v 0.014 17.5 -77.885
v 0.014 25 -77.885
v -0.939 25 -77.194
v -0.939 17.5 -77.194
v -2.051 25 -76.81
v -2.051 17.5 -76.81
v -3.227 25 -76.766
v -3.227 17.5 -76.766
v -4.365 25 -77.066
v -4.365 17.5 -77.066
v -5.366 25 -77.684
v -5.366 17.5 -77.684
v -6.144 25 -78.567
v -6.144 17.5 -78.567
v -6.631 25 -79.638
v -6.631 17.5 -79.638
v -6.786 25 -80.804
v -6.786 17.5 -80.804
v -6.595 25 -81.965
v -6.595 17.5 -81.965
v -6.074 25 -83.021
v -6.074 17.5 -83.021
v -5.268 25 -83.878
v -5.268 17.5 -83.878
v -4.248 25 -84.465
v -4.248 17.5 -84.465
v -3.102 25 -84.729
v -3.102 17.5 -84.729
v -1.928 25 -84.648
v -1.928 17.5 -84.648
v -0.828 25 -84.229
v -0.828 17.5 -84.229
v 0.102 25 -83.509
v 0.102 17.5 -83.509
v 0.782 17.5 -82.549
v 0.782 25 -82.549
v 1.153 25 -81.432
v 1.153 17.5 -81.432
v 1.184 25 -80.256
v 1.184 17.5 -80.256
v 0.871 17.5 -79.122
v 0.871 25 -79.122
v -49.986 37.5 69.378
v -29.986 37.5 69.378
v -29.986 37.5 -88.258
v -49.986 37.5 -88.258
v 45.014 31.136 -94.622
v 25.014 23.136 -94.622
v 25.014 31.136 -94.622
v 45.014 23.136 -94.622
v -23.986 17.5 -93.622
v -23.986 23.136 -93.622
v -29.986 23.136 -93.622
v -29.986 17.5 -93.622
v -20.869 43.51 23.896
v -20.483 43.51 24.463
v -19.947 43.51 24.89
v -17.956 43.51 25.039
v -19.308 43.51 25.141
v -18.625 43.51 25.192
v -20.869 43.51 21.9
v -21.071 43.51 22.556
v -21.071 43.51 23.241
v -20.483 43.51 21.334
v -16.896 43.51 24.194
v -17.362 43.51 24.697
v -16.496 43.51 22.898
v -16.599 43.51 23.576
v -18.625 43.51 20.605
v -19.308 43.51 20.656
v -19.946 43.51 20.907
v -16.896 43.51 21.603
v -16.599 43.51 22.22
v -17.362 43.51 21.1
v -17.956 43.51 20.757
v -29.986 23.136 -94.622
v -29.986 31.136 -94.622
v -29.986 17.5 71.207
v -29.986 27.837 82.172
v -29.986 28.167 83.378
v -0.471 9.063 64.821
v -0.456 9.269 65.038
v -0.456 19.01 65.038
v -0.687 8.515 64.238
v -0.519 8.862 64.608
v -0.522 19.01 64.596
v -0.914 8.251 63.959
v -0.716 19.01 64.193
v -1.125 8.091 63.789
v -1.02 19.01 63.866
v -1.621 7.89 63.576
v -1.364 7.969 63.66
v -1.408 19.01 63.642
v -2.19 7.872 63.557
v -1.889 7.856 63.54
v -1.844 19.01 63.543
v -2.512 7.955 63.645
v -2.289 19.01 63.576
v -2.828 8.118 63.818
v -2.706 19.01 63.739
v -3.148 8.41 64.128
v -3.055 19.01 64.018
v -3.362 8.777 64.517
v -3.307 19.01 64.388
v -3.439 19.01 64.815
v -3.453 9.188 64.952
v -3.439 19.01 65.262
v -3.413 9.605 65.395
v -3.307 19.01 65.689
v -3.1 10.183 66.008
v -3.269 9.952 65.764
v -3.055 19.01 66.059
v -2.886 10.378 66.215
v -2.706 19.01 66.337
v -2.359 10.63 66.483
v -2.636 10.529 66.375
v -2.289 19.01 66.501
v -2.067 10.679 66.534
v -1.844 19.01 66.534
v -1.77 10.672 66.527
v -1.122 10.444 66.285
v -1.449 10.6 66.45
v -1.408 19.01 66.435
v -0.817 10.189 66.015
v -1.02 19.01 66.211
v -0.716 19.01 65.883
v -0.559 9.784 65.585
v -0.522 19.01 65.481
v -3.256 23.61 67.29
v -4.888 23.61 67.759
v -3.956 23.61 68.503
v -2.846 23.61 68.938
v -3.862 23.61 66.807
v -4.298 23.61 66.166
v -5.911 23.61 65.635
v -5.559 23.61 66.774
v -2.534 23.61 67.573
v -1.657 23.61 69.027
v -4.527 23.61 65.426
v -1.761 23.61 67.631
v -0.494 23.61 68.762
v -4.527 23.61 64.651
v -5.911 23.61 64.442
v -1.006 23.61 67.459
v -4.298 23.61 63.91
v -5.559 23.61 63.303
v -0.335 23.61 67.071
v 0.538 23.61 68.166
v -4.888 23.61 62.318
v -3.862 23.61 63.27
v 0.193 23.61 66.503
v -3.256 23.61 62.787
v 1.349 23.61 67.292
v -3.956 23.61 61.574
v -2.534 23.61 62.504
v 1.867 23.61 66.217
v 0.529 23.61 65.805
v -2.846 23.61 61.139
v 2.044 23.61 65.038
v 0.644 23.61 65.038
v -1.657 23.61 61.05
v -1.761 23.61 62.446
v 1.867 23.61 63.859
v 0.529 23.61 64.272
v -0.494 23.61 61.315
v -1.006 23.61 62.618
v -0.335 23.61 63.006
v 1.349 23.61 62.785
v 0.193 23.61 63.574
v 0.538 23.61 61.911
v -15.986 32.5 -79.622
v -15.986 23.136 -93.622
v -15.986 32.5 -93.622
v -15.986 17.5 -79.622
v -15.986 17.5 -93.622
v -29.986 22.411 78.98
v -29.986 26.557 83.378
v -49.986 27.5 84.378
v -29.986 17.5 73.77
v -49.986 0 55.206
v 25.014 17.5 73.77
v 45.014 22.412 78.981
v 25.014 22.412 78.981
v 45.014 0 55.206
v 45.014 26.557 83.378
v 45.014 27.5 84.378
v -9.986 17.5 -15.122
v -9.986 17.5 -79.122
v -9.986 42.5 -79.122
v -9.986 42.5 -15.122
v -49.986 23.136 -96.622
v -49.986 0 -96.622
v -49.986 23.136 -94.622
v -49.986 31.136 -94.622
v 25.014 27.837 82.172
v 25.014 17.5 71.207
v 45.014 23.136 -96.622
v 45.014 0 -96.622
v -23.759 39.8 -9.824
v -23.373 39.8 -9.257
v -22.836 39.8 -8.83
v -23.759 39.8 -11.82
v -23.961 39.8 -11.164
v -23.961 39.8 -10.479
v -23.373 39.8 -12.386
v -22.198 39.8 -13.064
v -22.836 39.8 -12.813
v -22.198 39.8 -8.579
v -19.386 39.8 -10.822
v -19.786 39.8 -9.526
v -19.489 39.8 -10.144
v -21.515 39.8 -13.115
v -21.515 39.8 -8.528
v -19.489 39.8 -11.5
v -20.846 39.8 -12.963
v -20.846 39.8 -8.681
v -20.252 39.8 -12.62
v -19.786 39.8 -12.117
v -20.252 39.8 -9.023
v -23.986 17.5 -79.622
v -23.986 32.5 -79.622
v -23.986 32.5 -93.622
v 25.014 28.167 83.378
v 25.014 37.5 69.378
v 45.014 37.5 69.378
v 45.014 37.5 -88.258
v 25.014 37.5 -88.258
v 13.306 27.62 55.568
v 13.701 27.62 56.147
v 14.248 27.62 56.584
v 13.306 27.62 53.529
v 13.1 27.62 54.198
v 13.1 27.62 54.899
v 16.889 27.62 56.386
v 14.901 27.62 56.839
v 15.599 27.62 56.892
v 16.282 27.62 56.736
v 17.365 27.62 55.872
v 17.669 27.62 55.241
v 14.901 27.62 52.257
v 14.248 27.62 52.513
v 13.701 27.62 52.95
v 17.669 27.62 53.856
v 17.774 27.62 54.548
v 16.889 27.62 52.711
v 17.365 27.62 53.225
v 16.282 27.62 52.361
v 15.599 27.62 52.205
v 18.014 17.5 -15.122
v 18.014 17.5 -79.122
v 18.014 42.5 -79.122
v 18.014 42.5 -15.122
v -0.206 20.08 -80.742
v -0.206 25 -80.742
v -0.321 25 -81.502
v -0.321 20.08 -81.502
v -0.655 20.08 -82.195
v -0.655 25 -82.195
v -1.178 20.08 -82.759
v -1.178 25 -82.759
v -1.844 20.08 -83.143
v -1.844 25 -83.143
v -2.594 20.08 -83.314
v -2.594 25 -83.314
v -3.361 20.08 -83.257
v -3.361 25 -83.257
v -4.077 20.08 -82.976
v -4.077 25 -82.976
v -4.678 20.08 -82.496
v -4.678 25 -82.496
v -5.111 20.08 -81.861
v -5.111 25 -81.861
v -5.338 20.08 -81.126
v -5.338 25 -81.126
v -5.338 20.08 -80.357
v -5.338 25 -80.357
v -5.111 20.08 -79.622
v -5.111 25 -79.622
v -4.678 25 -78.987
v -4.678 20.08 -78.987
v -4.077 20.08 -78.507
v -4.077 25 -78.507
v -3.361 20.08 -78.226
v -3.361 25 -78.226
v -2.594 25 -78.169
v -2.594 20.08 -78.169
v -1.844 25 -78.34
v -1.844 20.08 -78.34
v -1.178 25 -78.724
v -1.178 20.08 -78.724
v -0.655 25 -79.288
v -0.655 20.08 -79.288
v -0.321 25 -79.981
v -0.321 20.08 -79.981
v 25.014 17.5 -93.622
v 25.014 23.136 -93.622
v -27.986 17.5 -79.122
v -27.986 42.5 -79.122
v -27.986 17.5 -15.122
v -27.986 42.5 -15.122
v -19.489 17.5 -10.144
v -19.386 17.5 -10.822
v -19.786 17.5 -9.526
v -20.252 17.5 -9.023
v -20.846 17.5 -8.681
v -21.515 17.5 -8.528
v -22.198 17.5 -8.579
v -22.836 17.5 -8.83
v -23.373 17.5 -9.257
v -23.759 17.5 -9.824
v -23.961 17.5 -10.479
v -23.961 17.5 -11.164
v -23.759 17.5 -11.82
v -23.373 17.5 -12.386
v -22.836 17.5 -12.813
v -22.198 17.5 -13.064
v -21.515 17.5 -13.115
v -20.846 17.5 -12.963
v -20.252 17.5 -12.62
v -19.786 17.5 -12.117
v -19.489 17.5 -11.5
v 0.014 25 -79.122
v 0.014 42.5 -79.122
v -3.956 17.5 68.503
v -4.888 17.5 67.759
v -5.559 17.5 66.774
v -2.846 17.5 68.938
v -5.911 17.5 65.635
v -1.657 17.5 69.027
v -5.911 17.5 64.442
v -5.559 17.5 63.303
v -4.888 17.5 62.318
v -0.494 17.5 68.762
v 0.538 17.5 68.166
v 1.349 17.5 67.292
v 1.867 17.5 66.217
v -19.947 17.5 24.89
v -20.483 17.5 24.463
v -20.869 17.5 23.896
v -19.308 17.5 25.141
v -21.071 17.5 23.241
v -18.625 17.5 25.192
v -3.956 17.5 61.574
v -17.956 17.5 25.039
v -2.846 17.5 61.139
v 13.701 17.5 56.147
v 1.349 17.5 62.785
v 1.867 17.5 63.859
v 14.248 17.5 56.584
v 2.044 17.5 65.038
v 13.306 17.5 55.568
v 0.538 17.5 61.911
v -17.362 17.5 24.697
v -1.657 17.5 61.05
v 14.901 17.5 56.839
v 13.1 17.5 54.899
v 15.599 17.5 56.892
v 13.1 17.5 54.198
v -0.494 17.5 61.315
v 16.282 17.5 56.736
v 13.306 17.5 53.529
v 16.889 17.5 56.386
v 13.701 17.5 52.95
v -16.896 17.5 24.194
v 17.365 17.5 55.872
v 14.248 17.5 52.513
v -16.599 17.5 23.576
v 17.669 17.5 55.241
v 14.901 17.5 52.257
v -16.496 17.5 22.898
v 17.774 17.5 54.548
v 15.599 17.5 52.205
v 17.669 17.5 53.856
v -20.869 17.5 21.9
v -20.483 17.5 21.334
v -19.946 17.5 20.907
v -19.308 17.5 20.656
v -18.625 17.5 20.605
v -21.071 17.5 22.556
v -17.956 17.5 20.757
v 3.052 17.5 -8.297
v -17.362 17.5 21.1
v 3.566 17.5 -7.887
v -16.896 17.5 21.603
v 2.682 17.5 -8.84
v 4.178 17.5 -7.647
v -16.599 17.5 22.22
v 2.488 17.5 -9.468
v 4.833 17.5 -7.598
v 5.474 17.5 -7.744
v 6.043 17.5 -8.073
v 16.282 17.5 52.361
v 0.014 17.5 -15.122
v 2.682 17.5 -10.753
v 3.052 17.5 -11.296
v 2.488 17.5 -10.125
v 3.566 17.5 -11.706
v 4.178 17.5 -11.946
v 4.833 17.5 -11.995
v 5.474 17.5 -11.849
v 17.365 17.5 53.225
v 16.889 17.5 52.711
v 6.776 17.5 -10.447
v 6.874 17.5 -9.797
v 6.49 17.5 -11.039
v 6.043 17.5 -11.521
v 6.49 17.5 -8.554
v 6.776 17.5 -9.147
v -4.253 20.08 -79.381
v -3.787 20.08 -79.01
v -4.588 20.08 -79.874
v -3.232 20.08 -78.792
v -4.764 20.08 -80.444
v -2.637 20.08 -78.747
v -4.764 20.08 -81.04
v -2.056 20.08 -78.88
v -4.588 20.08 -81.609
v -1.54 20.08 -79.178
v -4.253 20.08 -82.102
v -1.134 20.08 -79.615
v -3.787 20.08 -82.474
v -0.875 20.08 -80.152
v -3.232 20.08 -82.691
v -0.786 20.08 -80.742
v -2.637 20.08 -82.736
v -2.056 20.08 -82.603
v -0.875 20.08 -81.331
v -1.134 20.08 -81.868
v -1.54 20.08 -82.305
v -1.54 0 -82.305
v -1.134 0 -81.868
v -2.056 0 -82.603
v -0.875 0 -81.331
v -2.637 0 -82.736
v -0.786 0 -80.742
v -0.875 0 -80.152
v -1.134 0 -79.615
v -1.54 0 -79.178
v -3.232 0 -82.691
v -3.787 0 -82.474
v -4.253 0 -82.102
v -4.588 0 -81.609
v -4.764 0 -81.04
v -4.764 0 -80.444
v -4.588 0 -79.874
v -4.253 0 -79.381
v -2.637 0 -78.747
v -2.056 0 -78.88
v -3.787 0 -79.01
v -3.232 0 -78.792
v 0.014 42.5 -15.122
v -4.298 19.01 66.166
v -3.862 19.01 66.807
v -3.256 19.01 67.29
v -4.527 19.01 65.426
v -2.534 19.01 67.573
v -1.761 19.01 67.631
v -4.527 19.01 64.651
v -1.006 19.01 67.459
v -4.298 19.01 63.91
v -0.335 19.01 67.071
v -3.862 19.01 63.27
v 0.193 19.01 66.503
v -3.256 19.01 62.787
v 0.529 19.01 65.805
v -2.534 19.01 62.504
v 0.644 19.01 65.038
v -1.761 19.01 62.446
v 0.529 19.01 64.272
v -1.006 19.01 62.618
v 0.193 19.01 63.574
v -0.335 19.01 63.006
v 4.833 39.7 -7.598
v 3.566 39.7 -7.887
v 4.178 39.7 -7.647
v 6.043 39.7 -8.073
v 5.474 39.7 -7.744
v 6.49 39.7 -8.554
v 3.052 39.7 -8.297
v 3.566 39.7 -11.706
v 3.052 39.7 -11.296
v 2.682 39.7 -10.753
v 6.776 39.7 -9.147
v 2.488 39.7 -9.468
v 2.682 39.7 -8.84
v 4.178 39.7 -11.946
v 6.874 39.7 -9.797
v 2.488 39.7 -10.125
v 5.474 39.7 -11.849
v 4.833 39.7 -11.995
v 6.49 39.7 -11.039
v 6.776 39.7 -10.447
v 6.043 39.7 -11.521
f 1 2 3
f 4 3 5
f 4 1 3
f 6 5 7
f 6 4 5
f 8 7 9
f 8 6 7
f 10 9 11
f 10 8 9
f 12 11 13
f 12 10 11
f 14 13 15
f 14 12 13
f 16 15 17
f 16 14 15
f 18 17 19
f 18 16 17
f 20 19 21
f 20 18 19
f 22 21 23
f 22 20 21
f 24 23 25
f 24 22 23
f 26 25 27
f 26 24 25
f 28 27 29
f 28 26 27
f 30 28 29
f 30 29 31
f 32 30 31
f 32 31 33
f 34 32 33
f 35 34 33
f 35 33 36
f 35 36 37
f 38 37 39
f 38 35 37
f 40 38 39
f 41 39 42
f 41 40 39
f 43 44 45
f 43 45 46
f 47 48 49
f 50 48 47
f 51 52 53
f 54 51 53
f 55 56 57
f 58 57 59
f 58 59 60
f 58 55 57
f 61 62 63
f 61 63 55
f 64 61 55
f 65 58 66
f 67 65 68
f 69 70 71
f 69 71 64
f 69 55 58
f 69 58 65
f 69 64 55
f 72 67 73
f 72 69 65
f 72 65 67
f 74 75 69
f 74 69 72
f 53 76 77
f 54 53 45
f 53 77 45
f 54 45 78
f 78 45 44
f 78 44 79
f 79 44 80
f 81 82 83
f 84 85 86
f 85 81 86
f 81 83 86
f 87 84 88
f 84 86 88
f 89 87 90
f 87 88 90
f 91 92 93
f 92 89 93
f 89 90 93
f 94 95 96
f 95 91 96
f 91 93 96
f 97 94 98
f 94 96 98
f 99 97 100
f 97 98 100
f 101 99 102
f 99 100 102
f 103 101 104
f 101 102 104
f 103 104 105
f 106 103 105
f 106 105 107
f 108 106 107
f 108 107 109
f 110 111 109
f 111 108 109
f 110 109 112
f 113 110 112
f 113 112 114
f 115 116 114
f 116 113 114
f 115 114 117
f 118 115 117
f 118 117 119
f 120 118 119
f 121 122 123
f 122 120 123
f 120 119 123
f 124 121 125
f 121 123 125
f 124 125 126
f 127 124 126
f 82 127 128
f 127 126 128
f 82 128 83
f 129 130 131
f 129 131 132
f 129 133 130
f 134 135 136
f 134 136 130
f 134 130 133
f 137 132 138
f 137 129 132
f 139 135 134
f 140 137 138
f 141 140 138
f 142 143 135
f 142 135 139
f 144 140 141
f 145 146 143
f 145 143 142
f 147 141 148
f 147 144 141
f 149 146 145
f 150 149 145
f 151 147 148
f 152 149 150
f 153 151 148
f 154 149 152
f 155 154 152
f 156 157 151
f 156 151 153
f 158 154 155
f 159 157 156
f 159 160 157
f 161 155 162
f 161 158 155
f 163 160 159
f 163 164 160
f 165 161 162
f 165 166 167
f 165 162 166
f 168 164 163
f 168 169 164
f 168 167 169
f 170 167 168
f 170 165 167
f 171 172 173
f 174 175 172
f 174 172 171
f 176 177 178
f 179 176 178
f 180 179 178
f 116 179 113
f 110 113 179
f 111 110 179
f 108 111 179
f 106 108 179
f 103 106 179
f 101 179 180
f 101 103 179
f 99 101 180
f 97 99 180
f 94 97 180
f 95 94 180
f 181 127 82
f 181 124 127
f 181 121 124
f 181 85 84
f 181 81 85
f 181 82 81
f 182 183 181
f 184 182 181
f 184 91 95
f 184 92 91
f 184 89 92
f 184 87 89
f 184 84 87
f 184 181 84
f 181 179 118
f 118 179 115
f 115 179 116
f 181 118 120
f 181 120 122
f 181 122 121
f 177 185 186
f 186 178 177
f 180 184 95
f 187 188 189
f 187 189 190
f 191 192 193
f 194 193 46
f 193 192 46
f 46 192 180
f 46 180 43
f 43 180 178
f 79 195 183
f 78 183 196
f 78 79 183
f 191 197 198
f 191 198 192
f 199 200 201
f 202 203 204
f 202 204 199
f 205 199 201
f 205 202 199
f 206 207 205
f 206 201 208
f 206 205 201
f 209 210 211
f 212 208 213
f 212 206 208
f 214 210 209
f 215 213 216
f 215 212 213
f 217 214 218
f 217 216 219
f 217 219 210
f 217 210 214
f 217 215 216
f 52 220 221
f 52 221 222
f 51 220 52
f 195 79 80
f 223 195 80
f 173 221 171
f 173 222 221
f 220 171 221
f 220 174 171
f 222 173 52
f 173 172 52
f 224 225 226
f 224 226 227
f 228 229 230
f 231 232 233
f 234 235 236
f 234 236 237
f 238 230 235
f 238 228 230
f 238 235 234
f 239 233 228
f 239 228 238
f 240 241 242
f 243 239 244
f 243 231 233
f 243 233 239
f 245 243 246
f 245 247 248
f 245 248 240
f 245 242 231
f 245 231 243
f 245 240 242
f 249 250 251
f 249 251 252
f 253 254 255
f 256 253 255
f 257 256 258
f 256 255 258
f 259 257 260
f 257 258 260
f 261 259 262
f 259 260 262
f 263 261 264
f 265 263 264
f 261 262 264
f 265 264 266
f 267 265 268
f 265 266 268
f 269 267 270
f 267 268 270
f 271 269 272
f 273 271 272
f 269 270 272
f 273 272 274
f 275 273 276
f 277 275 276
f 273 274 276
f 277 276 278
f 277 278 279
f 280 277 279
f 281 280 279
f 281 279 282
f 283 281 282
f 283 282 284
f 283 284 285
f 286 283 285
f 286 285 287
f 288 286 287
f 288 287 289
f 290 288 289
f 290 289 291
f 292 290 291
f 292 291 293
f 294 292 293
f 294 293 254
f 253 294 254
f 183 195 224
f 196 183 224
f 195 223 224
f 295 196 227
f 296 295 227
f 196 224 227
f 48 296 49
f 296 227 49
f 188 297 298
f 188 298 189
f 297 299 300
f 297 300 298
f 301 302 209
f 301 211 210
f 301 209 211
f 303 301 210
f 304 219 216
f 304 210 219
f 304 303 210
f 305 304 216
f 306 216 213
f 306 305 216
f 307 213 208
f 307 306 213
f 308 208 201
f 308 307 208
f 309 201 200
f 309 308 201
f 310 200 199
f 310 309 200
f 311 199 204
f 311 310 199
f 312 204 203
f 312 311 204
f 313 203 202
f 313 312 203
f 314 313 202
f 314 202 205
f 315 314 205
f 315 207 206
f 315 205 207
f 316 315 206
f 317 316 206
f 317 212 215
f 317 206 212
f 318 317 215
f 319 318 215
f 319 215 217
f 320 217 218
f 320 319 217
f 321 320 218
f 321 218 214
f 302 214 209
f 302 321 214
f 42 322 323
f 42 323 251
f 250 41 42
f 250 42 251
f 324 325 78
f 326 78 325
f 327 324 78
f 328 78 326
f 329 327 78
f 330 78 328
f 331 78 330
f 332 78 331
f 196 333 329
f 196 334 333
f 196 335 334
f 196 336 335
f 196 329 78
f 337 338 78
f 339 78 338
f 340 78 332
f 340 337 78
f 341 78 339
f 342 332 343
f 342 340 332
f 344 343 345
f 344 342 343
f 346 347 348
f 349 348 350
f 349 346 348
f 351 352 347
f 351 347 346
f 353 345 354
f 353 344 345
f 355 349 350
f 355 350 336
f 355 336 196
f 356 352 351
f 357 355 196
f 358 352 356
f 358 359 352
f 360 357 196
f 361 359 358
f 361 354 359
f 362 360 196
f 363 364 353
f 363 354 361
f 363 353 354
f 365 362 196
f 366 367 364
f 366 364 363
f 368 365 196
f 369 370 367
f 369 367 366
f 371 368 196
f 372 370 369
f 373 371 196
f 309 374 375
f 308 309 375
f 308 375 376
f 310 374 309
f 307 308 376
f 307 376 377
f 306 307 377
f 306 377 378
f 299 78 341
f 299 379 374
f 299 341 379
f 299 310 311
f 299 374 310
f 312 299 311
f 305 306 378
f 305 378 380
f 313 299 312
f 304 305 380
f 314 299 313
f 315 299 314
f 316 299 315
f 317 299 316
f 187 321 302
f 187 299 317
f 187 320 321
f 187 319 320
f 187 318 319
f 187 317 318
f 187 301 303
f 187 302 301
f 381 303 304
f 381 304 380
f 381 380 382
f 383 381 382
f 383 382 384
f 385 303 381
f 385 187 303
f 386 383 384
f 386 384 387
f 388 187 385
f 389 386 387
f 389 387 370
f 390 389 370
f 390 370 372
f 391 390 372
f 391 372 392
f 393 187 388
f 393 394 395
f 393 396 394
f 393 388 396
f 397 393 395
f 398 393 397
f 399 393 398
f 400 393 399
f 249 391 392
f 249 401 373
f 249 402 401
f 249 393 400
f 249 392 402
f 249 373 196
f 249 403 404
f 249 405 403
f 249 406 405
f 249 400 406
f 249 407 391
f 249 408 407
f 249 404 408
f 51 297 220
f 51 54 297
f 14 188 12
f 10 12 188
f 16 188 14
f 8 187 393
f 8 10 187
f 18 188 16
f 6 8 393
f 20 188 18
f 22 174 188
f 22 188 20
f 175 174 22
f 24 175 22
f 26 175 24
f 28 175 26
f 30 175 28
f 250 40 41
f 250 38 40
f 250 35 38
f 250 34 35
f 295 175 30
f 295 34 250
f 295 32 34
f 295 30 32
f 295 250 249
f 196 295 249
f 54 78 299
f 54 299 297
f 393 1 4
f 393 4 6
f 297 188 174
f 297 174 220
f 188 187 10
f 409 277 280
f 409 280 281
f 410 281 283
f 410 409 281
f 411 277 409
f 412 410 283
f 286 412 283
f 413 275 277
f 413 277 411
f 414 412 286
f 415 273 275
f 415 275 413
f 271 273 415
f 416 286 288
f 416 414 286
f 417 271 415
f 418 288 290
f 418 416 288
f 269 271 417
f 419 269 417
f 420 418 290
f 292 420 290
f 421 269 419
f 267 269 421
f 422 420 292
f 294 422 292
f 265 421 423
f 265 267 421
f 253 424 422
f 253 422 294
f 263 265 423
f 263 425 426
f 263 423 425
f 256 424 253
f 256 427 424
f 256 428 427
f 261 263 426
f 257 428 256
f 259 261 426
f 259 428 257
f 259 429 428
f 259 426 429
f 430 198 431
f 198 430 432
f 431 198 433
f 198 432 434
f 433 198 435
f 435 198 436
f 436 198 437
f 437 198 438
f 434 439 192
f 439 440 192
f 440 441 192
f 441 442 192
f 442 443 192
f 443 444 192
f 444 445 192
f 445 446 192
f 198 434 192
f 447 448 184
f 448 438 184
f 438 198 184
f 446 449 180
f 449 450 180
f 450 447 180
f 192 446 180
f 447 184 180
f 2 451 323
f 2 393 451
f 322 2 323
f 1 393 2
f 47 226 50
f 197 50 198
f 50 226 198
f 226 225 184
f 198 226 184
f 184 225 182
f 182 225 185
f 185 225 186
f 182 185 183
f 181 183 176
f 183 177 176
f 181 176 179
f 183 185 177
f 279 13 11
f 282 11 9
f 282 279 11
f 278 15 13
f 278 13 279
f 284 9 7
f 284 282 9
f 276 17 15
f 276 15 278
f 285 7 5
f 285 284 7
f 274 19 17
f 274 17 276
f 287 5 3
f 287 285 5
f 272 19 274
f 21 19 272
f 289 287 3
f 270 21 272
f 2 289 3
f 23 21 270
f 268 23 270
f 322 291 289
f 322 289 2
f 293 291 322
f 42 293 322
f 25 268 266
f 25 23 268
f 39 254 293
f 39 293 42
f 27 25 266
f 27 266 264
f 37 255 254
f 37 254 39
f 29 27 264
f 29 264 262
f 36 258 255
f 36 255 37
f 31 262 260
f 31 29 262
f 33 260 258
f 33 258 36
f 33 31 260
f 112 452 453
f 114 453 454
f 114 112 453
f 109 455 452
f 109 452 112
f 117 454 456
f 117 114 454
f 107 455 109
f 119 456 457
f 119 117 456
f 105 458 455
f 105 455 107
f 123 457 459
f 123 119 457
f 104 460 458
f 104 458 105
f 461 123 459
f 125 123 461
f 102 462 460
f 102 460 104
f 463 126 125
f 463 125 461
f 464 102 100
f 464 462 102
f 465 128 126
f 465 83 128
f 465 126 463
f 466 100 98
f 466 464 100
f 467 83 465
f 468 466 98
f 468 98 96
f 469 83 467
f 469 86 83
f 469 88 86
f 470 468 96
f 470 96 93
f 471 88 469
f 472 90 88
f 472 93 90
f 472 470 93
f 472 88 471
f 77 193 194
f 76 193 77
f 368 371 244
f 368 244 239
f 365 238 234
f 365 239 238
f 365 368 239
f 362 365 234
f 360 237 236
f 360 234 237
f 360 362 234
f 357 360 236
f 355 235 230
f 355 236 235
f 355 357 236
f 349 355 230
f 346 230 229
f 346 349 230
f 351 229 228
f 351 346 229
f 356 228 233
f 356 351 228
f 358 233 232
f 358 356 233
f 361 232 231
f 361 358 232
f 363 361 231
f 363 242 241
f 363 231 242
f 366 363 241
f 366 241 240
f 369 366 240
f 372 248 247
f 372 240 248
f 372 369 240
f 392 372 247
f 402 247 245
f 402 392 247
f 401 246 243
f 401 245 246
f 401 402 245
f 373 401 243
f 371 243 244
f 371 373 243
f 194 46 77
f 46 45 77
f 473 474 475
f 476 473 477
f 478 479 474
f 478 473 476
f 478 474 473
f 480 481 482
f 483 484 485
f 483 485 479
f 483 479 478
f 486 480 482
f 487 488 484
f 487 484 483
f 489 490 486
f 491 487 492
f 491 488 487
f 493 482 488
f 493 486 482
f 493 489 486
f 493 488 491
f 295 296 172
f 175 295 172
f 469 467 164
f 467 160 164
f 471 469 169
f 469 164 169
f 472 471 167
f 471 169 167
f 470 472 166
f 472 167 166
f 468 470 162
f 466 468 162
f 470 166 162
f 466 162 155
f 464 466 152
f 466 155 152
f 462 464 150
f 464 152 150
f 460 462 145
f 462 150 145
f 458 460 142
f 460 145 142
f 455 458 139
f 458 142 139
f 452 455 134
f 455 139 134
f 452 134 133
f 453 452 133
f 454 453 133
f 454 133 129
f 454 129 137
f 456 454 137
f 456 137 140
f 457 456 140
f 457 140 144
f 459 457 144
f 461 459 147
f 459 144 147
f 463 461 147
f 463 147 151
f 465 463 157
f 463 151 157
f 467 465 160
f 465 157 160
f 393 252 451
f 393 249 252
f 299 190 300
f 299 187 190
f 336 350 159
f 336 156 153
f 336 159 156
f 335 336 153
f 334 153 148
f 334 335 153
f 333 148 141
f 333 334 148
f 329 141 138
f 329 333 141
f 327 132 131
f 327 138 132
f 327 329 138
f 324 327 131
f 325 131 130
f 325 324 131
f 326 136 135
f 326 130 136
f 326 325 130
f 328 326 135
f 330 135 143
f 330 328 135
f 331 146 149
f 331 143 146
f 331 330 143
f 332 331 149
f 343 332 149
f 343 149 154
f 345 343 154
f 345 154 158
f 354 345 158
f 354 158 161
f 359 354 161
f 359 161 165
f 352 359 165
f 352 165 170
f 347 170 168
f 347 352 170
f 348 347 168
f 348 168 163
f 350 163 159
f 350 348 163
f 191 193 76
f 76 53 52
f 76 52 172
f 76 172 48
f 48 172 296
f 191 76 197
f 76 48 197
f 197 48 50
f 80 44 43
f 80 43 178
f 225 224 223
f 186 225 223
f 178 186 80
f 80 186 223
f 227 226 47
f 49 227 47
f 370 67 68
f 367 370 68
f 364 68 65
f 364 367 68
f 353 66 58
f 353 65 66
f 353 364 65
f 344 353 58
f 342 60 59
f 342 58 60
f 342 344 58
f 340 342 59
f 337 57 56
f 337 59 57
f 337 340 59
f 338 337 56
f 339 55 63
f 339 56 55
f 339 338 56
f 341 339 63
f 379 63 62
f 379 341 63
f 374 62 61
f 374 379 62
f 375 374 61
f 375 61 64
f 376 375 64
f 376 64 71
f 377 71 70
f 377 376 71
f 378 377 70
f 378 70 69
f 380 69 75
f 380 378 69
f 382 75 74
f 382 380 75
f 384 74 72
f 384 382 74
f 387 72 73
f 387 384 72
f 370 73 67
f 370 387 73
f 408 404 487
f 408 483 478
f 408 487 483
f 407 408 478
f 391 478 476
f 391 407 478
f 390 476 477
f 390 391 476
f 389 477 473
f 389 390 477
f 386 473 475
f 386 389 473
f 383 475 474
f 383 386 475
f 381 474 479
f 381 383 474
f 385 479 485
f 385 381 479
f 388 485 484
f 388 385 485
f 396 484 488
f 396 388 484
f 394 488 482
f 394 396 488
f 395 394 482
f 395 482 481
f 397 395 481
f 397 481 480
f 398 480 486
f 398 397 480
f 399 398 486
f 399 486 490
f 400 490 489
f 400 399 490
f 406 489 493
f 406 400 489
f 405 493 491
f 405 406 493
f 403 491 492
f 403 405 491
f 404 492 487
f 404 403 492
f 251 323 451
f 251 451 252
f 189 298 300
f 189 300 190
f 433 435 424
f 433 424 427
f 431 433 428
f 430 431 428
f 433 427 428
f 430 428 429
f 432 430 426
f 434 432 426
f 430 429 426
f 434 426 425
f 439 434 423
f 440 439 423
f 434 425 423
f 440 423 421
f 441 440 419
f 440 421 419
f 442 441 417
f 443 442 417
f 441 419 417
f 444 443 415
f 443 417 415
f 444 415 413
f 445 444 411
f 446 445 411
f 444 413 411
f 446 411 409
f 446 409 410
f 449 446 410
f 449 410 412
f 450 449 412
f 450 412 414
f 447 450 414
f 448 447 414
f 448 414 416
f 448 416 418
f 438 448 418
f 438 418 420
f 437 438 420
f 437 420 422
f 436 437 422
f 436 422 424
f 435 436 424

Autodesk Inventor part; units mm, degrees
ref_plane "YZ Plane" through (0, 0, 0) normal (1, 0, 0) x (0, 1, 0)
ref_plane "XZ Plane" through (0, 0, 0) normal (0, 1, 0) x (-1, 0, 0)
ref_plane "XY Plane" through (0, 0, 0) normal (0, 0, 1) x (1, 0, 0)
sketch "Sketch1" plane through (0, 0, 0) normal (0, 1, 0) x (-1, 0, 0)
  line L0 (-45.0135, 84.3784) -> (49.9865, 84.3784)
  line L1 (49.9865, 84.3784) -> (49.9865, -94.6216)
  line L2 (49.9865, -94.6216) -> (-45.0135, -94.6216)
  line L3 (-45.0135, -94.6216) -> (-45.0135, 84.3784)
  point P0 (0, 0)
  dimension "d0" = 179
  dimension "d1" = 95
extrude "test" add sketch "Sketch1" along normal blind 37.5
sketch "Sketch2" plane through (0, 37.5, 0) normal (0, 1, 0) x (1, 0, 0)
  line L0 (-29.9865, -83.3784) -> (25.0135, -83.3784)
  line L1 (25.0135, -83.3784) -> (25.0135, 93.6216)
  line L2 (25.0135, 93.6216) -> (-29.9865, 93.6216)
  line L3 (-29.9865, 93.6216) -> (-29.9865, -83.3784)
  line L4 (-49.9865, -84.3784) -> (45.0135, -84.3784) projected
  line L5 (-49.9865, 94.6216) -> (-49.9865, -84.3784) projected
  point P0 (0, 0)
  dimension "d4" = 55
  dimension "d5" = 177
  dimension "d6" = 1
  dimension "d7" = 20
extrude "hasa" cut sketch "Sketch2" against normal blind 20
sketch "Sketch3" plane through (45.0135, 0, 84.3784) normal (1, 0, 0) x (0, 0, -1)
  line L0 (179, 37.5) -> (172.636, 37.5)
  line L1 (172.636, 37.5) -> (172.636, 37.5)
  line L2 (179, 31.136) -> (179, 31.136)
  line L3 (179, 31.136) -> (179, 37.5)
  line L4 (0, 37.5) -> (179, 37.5) projected
  line L5 (179, 0) -> (179, 37.5) projected
  line L6 (172.636, 37.5) -> (179, 31.136)
  point P0 (84.3784, 0)
  point P1 (172.636, 31.136)
  dimension "d10" = 6.364
  dimension "d11" = 6.364
  dimension "d12" = 0
  dimension "d13" = 0
  dimension "d14" = 6.364
  dimension "d15" = 45
extrude "hátsó levágás" cut sketch "Sketch3" against normal through all
sketch "Sketch4" plane through (45.0135, 0, -94.6216) normal (0, 0, -1) x (-1, 0, 0)
  line L0 (95, 0) -> (95, 37.5) projected
  line L1 (0, 0) -> (95, 0)
  line L2 (95, 0) -> (95, 23.136)
  line L3 (95, 23.136) -> (0, 23.136)
  line L4 (0, 23.136) -> (0, 0)
  line L5 (95, 31.136) -> (0, 31.136) projected
  point P0 (45.0135, 0)
  dimension "d18" = 8
extrude "hátsó kiszögellés" add sketch "Sketch4" along normal blind 2
sketch "Sketch6" plane through (45.0135, 31.136, -94.6216) normal (0, 0, -1) x (-1, 0, 0)
  line L0 (20, 1) -> (20, -13.636) projected
  line L1 (95, -8) -> (0, -8) projected
  line L2 (20, 1) -> (75, 1)
  line L3 (75, 1) -> (75, -8)
  line L4 (75, -8) -> (20, -8)
  line L5 (20, -8) -> (20, 1)
  line L6 (75, 1) -> (75, 6.364) projected
  line L7 (20, 1) -> (75, 1) projected
  point P0 (45.0135, -31.136)
  dimension "d21" = 0
extrude "Extrusion5" cut sketch "Sketch6" against normal up to surface (1 mm away)
sketch "Sketch7" plane through (0, 17.5, 0) normal (0, 1, 0) x (1, 0, 0)
  line L0 (25.0135, 93.6216) -> (-29.9865, 93.6216) projected
  line L1 (-23.9865, 93.6216) -> (-15.9865, 93.6216)
  line L2 (-15.9865, 93.6216) -> (-15.9865, 79.6216)
  line L3 (-15.9865, 79.6216) -> (-23.9865, 79.6216)
  line L4 (-23.9865, 79.6216) -> (-23.9865, 93.6216)
  line L5 (-29.9865, -83.3784) -> (-29.9865, 88.2577) projected
  point P0 (0, 0)
  dimension "d24" = 14
  dimension "d25" = 8
  dimension "d26" = 6
extrude "táp csati" add sketch "Sketch7" along normal blind 15
sketch "Sketch8" plane through (45.0135, 0, 84.3784) normal (1, 0, 0) x (0, 0, -1)
  line L0 (0, 0) -> (0, 37.5) projected
  line L1 (0, 37.5) -> (15, 37.5)
  line L2 (15, 37.5) -> (15, 37.5)
  line L3 (0, 27.5) -> (0, 27.5)
  line L4 (0, 27.5) -> (0, 37.5)
  line L5 (15, 37.5) -> (0, 27.5)
  point P0 (84.3784, 0)
  point P1 (15, 27.5)
  dimension "d29" = 10
  dimension "d30" = 10
  dimension "d31" = 15
  dimension "d32" = 15
extrude "első levágás" cut sketch "Sketch8" against normal through all
sketch "Sketch9" plane through (0, 17.5, 0) normal (0, 1, 0) x (1, 0, 0)
  line L0 (-27.9865, 79.1216) -> (-9.9865, 79.1216)
  line L1 (-9.9865, 79.1216) -> (-9.9865, 15.1216)
  line L2 (-9.9865, 15.1216) -> (-27.9865, 15.1216)
  line L3 (-27.9865, 15.1216) -> (-27.9865, 79.1216)
  line L4 (-29.9865, -69.3784) -> (-29.9865, 88.2577) projected
  line L5 (25.0135, 93.6216) -> (-15.9865, 93.6216) projected
  line L6 (25.0135, 88.2577) -> (25.0135, -69.3784) projected
  point P0 (0, 0)
  dimension "d35" = 64
  dimension "d36" = 18
  dimension "d37" = 2
  dimension "d38" = 14.5
extrude "motor jobb" add sketch "Sketch9" along normal blind 25
sketch "Sketch10" plane through (0, 17.5, 0) normal (0, 1, 0) x (1, 0, 0)
  line L0 (0.0135, 79.1216) -> (18.0135, 79.1216)
  line L1 (18.0135, 79.1216) -> (18.0135, 15.1216)
  line L2 (18.0135, 15.1216) -> (0.0135, 15.1216)
  line L3 (0.0135, 15.1216) -> (0.0135, 79.1216)
  line L4 (25.0135, 88.2577) -> (25.0135, -69.3784) projected
  line L5 (25.0135, 93.6216) -> (-15.9865, 93.6216) projected
  point P0 (0, 0)
  dimension "d45" = 7
  dimension "d46" = 18
  dimension "d47" = 64
  dimension "d48" = 14.5
extrude "motor bal" add sketch "Sketch10" along normal blind 25
sketch "Sketch11" plane through (45.0135, 0, -96.6216) normal (1, 0, 0) x (0, 0, -1)
  line L0 (-181, 0) -> (-181, 27.5) projected
  line L1 (-181, 27.5) -> (-151.8278, 0)
  line L2 (0, 0) -> (-181, 0) projected
  line L3 (-166, 37.5) -> (-181, 27.5) projected
  point P0 (-96.6216, 0)
  dimension "d51" = 77
extrude "eleje alső levágás" cut sketch "Sketch11" against normal through all
sketch "Sketch12" plane through (-29.9865, 23.136, -94.6216) normal (1, 0, 0) x (0, 0, -1)
  line L0 (-168.3919, -5.636) -> (-1, -5.636) projected
  line L1 (-178, 3.4213) -> (-168.3919, -5.636) projected
  line L2 (-168.3919, -5.636) -> (-178, 3.4213)
  line L3 (-178, 3.4213) -> (-176.7937, 4.7009)
  line L4 (-176.7937, 4.7009) -> (-165.8282, -5.636)
  line L5 (-167.1856, -4.3564) -> (-168.3919, -5.636)
  line L6 (-164, 14.364) -> (-178, 5.0306) projected
  line L7 (-176.7937, 4.7009) -> (-178, 5.0306)
  line L8 (-178, 5.0306) -> (-178, 3.4213)
  line L9 (-168.3919, -5.636) -> (-165.8282, -5.636)
  point P0 (-94.6216, -23.136)
extrude "eleje korrekció" add sketch "Sketch12" along normal up to next
sketch "Sketch13" plane through (0, 17.5, 0) normal (0, 1, 0) x (1, 0, 0)
  circle A0 centre (-18.7965, -22.8984) radius 2.3
  line L0 (-29.9865, -69.3784) -> (-29.9865, 88.2577) projected
  line L1 (-29.9865, -83.3784) -> (25.0135, -83.3784) projected
  line L2 (45.0135, -84.3784) -> (-49.9865, -84.3784) projected
  point P0 (0, 0)
  dimension "d56" = 4.6
  dimension "d57" = 11.19
  dimension "d74" = 61.48
extrude "oszlop1" add sketch "Sketch13" along normal blind 26.01
sketch "Sketch14" plane through (0, 17.5, 0) normal (0, 1, 0) x (1, 0, 0)
  circle A0 centre (-21.6865, 10.8216) radius 2.3
  line L0 (-29.9865, -69.3784) -> (-29.9865, 88.2577) projected
  line L1 (-27.9865, 15.1216) -> (-9.9865, 15.1216) projected
  point P0 (0, 0)
  dimension "d61" = 4.6
  dimension "d70" = 8.3
  dimension "d71" = 4.3
extrude "oszlop2" add sketch "Sketch14" along normal blind 22.3
sketch "Sketch15" plane through (0, 17.5, 0) normal (0, 1, 0) x (1, 0, 0)
  circle A0 centre (4.6685, 9.7966) radius 2.205
  line L0 (45.0135, -84.3784) -> (-49.9865, -84.3784) projected
  line L1 (25.0135, 88.2577) -> (25.0135, -69.3784) projected
  point P0 (0, 0)
  dimension "d64" = 4.41
  dimension "d72" = 94.175
  dimension "d73" = 20.345
extrude "oszlop3" add sketch "Sketch15" along normal blind 22.2
sketch "Sketch16" plane through (0, 17.5, 0) normal (0, 1, 0) x (1, 0, 0)
  circle A0 centre (15.4235, -54.5484) radius 2.35
  line L0 (45.0135, -84.3784) -> (-49.9865, -84.3784) projected
  line L1 (25.0135, 88.2577) -> (25.0135, -69.3784) projected
  point P0 (0, 0)
  dimension "d67" = 4.7
  dimension "d75" = 29.83
  dimension "d76" = 9.59
extrude "oszlop4" add sketch "Sketch16" along normal blind 10.12
sketch "Sketch17" plane through (0, 17.5, 0) normal (0, 1, 0) x (1, 0, 0)
  circle A0 centre (-1.9556, -65.0384) radius 4
  line L0 (45.0135, -84.3784) -> (-49.9865, -84.3784) projected
  point P0 (0, 0)
  dimension "d77" = 8
  dimension "d78" = 19.34
extrude "Extrusion16" add sketch "Sketch17" along normal blind 6.11
sketch "Sketch18" plane through (-1.9556, 23.61, 65.0384) normal (0, 1, 0) x (1, 0, 0)
  circle A0 centre (0, 0) radius 2.6
  circle A1 centre (0, 0) radius 4 projected
  point P0 (1.9556, 65.0384)
  dimension "d81" = 1.4
extrude "Extrusion17" cut sketch "Sketch18" against normal blind 4.6 contours A0
sketch "Sketch19" plane through (-1.9556, 19.01, 65.0384) normal (0, 1, 0) x (1, 0, 0)
  circle A0 centre (0, 0) radius 1.5
  point P0 (1.9556, 65.0384)
  dimension "d84" = 3
extrude "Extrusion18" cut sketch "Sketch19" against normal through all
sketch "Sketch20" plane through (0, 17.5, 0) normal (0, 1, 0) x (1, 0, 0)
  circle A0 centre (-2.7865, 80.7416) radius 4
  line L0 (-49.9865, 96.6216) -> (45.0135, 96.6216) projected
  line L1 (25.0135, 88.2577) -> (25.0135, -69.3784) projected
  point P0 (0, 0)
  dimension "d87" = 8
  dimension "d88" = 15.88
  dimension "d89" = 27.8
extrude "Extrusion19" add sketch "Sketch20" along normal blind 7.5
sketch "Sketch21" plane through (0, 25, 0) normal (0, 1, 0) x (1, 0, 0)
  circle A0 centre (-2.7865, 80.7416) radius 2.58
  arc A1 (0.8708, 79.1216) -> (0.0135, 77.8851) centre (-2.7865, 80.7416) ccw projected
  point P0 (0, 0)
  dimension "d92" = 0
  dimension "d93" = 0
  dimension "d94" = 1.42
extrude "Extrusion20" cut sketch "Sketch21" against normal blind 4.92
sketch "Sketch22" plane through (-2.7865, 20.08, -80.7416) normal (0, 1, 0) x (1, 0, 0)
  circle A0 centre (0, 0) radius 2
  point P0 (2.7865, -80.7416)
  dimension "d97" = 4
extrude "Extrusion21" cut sketch "Sketch22" against normal through all
equation "\"d11\" = d10"
equation "\"d14\" = d10"
properties part number "kocsi"
